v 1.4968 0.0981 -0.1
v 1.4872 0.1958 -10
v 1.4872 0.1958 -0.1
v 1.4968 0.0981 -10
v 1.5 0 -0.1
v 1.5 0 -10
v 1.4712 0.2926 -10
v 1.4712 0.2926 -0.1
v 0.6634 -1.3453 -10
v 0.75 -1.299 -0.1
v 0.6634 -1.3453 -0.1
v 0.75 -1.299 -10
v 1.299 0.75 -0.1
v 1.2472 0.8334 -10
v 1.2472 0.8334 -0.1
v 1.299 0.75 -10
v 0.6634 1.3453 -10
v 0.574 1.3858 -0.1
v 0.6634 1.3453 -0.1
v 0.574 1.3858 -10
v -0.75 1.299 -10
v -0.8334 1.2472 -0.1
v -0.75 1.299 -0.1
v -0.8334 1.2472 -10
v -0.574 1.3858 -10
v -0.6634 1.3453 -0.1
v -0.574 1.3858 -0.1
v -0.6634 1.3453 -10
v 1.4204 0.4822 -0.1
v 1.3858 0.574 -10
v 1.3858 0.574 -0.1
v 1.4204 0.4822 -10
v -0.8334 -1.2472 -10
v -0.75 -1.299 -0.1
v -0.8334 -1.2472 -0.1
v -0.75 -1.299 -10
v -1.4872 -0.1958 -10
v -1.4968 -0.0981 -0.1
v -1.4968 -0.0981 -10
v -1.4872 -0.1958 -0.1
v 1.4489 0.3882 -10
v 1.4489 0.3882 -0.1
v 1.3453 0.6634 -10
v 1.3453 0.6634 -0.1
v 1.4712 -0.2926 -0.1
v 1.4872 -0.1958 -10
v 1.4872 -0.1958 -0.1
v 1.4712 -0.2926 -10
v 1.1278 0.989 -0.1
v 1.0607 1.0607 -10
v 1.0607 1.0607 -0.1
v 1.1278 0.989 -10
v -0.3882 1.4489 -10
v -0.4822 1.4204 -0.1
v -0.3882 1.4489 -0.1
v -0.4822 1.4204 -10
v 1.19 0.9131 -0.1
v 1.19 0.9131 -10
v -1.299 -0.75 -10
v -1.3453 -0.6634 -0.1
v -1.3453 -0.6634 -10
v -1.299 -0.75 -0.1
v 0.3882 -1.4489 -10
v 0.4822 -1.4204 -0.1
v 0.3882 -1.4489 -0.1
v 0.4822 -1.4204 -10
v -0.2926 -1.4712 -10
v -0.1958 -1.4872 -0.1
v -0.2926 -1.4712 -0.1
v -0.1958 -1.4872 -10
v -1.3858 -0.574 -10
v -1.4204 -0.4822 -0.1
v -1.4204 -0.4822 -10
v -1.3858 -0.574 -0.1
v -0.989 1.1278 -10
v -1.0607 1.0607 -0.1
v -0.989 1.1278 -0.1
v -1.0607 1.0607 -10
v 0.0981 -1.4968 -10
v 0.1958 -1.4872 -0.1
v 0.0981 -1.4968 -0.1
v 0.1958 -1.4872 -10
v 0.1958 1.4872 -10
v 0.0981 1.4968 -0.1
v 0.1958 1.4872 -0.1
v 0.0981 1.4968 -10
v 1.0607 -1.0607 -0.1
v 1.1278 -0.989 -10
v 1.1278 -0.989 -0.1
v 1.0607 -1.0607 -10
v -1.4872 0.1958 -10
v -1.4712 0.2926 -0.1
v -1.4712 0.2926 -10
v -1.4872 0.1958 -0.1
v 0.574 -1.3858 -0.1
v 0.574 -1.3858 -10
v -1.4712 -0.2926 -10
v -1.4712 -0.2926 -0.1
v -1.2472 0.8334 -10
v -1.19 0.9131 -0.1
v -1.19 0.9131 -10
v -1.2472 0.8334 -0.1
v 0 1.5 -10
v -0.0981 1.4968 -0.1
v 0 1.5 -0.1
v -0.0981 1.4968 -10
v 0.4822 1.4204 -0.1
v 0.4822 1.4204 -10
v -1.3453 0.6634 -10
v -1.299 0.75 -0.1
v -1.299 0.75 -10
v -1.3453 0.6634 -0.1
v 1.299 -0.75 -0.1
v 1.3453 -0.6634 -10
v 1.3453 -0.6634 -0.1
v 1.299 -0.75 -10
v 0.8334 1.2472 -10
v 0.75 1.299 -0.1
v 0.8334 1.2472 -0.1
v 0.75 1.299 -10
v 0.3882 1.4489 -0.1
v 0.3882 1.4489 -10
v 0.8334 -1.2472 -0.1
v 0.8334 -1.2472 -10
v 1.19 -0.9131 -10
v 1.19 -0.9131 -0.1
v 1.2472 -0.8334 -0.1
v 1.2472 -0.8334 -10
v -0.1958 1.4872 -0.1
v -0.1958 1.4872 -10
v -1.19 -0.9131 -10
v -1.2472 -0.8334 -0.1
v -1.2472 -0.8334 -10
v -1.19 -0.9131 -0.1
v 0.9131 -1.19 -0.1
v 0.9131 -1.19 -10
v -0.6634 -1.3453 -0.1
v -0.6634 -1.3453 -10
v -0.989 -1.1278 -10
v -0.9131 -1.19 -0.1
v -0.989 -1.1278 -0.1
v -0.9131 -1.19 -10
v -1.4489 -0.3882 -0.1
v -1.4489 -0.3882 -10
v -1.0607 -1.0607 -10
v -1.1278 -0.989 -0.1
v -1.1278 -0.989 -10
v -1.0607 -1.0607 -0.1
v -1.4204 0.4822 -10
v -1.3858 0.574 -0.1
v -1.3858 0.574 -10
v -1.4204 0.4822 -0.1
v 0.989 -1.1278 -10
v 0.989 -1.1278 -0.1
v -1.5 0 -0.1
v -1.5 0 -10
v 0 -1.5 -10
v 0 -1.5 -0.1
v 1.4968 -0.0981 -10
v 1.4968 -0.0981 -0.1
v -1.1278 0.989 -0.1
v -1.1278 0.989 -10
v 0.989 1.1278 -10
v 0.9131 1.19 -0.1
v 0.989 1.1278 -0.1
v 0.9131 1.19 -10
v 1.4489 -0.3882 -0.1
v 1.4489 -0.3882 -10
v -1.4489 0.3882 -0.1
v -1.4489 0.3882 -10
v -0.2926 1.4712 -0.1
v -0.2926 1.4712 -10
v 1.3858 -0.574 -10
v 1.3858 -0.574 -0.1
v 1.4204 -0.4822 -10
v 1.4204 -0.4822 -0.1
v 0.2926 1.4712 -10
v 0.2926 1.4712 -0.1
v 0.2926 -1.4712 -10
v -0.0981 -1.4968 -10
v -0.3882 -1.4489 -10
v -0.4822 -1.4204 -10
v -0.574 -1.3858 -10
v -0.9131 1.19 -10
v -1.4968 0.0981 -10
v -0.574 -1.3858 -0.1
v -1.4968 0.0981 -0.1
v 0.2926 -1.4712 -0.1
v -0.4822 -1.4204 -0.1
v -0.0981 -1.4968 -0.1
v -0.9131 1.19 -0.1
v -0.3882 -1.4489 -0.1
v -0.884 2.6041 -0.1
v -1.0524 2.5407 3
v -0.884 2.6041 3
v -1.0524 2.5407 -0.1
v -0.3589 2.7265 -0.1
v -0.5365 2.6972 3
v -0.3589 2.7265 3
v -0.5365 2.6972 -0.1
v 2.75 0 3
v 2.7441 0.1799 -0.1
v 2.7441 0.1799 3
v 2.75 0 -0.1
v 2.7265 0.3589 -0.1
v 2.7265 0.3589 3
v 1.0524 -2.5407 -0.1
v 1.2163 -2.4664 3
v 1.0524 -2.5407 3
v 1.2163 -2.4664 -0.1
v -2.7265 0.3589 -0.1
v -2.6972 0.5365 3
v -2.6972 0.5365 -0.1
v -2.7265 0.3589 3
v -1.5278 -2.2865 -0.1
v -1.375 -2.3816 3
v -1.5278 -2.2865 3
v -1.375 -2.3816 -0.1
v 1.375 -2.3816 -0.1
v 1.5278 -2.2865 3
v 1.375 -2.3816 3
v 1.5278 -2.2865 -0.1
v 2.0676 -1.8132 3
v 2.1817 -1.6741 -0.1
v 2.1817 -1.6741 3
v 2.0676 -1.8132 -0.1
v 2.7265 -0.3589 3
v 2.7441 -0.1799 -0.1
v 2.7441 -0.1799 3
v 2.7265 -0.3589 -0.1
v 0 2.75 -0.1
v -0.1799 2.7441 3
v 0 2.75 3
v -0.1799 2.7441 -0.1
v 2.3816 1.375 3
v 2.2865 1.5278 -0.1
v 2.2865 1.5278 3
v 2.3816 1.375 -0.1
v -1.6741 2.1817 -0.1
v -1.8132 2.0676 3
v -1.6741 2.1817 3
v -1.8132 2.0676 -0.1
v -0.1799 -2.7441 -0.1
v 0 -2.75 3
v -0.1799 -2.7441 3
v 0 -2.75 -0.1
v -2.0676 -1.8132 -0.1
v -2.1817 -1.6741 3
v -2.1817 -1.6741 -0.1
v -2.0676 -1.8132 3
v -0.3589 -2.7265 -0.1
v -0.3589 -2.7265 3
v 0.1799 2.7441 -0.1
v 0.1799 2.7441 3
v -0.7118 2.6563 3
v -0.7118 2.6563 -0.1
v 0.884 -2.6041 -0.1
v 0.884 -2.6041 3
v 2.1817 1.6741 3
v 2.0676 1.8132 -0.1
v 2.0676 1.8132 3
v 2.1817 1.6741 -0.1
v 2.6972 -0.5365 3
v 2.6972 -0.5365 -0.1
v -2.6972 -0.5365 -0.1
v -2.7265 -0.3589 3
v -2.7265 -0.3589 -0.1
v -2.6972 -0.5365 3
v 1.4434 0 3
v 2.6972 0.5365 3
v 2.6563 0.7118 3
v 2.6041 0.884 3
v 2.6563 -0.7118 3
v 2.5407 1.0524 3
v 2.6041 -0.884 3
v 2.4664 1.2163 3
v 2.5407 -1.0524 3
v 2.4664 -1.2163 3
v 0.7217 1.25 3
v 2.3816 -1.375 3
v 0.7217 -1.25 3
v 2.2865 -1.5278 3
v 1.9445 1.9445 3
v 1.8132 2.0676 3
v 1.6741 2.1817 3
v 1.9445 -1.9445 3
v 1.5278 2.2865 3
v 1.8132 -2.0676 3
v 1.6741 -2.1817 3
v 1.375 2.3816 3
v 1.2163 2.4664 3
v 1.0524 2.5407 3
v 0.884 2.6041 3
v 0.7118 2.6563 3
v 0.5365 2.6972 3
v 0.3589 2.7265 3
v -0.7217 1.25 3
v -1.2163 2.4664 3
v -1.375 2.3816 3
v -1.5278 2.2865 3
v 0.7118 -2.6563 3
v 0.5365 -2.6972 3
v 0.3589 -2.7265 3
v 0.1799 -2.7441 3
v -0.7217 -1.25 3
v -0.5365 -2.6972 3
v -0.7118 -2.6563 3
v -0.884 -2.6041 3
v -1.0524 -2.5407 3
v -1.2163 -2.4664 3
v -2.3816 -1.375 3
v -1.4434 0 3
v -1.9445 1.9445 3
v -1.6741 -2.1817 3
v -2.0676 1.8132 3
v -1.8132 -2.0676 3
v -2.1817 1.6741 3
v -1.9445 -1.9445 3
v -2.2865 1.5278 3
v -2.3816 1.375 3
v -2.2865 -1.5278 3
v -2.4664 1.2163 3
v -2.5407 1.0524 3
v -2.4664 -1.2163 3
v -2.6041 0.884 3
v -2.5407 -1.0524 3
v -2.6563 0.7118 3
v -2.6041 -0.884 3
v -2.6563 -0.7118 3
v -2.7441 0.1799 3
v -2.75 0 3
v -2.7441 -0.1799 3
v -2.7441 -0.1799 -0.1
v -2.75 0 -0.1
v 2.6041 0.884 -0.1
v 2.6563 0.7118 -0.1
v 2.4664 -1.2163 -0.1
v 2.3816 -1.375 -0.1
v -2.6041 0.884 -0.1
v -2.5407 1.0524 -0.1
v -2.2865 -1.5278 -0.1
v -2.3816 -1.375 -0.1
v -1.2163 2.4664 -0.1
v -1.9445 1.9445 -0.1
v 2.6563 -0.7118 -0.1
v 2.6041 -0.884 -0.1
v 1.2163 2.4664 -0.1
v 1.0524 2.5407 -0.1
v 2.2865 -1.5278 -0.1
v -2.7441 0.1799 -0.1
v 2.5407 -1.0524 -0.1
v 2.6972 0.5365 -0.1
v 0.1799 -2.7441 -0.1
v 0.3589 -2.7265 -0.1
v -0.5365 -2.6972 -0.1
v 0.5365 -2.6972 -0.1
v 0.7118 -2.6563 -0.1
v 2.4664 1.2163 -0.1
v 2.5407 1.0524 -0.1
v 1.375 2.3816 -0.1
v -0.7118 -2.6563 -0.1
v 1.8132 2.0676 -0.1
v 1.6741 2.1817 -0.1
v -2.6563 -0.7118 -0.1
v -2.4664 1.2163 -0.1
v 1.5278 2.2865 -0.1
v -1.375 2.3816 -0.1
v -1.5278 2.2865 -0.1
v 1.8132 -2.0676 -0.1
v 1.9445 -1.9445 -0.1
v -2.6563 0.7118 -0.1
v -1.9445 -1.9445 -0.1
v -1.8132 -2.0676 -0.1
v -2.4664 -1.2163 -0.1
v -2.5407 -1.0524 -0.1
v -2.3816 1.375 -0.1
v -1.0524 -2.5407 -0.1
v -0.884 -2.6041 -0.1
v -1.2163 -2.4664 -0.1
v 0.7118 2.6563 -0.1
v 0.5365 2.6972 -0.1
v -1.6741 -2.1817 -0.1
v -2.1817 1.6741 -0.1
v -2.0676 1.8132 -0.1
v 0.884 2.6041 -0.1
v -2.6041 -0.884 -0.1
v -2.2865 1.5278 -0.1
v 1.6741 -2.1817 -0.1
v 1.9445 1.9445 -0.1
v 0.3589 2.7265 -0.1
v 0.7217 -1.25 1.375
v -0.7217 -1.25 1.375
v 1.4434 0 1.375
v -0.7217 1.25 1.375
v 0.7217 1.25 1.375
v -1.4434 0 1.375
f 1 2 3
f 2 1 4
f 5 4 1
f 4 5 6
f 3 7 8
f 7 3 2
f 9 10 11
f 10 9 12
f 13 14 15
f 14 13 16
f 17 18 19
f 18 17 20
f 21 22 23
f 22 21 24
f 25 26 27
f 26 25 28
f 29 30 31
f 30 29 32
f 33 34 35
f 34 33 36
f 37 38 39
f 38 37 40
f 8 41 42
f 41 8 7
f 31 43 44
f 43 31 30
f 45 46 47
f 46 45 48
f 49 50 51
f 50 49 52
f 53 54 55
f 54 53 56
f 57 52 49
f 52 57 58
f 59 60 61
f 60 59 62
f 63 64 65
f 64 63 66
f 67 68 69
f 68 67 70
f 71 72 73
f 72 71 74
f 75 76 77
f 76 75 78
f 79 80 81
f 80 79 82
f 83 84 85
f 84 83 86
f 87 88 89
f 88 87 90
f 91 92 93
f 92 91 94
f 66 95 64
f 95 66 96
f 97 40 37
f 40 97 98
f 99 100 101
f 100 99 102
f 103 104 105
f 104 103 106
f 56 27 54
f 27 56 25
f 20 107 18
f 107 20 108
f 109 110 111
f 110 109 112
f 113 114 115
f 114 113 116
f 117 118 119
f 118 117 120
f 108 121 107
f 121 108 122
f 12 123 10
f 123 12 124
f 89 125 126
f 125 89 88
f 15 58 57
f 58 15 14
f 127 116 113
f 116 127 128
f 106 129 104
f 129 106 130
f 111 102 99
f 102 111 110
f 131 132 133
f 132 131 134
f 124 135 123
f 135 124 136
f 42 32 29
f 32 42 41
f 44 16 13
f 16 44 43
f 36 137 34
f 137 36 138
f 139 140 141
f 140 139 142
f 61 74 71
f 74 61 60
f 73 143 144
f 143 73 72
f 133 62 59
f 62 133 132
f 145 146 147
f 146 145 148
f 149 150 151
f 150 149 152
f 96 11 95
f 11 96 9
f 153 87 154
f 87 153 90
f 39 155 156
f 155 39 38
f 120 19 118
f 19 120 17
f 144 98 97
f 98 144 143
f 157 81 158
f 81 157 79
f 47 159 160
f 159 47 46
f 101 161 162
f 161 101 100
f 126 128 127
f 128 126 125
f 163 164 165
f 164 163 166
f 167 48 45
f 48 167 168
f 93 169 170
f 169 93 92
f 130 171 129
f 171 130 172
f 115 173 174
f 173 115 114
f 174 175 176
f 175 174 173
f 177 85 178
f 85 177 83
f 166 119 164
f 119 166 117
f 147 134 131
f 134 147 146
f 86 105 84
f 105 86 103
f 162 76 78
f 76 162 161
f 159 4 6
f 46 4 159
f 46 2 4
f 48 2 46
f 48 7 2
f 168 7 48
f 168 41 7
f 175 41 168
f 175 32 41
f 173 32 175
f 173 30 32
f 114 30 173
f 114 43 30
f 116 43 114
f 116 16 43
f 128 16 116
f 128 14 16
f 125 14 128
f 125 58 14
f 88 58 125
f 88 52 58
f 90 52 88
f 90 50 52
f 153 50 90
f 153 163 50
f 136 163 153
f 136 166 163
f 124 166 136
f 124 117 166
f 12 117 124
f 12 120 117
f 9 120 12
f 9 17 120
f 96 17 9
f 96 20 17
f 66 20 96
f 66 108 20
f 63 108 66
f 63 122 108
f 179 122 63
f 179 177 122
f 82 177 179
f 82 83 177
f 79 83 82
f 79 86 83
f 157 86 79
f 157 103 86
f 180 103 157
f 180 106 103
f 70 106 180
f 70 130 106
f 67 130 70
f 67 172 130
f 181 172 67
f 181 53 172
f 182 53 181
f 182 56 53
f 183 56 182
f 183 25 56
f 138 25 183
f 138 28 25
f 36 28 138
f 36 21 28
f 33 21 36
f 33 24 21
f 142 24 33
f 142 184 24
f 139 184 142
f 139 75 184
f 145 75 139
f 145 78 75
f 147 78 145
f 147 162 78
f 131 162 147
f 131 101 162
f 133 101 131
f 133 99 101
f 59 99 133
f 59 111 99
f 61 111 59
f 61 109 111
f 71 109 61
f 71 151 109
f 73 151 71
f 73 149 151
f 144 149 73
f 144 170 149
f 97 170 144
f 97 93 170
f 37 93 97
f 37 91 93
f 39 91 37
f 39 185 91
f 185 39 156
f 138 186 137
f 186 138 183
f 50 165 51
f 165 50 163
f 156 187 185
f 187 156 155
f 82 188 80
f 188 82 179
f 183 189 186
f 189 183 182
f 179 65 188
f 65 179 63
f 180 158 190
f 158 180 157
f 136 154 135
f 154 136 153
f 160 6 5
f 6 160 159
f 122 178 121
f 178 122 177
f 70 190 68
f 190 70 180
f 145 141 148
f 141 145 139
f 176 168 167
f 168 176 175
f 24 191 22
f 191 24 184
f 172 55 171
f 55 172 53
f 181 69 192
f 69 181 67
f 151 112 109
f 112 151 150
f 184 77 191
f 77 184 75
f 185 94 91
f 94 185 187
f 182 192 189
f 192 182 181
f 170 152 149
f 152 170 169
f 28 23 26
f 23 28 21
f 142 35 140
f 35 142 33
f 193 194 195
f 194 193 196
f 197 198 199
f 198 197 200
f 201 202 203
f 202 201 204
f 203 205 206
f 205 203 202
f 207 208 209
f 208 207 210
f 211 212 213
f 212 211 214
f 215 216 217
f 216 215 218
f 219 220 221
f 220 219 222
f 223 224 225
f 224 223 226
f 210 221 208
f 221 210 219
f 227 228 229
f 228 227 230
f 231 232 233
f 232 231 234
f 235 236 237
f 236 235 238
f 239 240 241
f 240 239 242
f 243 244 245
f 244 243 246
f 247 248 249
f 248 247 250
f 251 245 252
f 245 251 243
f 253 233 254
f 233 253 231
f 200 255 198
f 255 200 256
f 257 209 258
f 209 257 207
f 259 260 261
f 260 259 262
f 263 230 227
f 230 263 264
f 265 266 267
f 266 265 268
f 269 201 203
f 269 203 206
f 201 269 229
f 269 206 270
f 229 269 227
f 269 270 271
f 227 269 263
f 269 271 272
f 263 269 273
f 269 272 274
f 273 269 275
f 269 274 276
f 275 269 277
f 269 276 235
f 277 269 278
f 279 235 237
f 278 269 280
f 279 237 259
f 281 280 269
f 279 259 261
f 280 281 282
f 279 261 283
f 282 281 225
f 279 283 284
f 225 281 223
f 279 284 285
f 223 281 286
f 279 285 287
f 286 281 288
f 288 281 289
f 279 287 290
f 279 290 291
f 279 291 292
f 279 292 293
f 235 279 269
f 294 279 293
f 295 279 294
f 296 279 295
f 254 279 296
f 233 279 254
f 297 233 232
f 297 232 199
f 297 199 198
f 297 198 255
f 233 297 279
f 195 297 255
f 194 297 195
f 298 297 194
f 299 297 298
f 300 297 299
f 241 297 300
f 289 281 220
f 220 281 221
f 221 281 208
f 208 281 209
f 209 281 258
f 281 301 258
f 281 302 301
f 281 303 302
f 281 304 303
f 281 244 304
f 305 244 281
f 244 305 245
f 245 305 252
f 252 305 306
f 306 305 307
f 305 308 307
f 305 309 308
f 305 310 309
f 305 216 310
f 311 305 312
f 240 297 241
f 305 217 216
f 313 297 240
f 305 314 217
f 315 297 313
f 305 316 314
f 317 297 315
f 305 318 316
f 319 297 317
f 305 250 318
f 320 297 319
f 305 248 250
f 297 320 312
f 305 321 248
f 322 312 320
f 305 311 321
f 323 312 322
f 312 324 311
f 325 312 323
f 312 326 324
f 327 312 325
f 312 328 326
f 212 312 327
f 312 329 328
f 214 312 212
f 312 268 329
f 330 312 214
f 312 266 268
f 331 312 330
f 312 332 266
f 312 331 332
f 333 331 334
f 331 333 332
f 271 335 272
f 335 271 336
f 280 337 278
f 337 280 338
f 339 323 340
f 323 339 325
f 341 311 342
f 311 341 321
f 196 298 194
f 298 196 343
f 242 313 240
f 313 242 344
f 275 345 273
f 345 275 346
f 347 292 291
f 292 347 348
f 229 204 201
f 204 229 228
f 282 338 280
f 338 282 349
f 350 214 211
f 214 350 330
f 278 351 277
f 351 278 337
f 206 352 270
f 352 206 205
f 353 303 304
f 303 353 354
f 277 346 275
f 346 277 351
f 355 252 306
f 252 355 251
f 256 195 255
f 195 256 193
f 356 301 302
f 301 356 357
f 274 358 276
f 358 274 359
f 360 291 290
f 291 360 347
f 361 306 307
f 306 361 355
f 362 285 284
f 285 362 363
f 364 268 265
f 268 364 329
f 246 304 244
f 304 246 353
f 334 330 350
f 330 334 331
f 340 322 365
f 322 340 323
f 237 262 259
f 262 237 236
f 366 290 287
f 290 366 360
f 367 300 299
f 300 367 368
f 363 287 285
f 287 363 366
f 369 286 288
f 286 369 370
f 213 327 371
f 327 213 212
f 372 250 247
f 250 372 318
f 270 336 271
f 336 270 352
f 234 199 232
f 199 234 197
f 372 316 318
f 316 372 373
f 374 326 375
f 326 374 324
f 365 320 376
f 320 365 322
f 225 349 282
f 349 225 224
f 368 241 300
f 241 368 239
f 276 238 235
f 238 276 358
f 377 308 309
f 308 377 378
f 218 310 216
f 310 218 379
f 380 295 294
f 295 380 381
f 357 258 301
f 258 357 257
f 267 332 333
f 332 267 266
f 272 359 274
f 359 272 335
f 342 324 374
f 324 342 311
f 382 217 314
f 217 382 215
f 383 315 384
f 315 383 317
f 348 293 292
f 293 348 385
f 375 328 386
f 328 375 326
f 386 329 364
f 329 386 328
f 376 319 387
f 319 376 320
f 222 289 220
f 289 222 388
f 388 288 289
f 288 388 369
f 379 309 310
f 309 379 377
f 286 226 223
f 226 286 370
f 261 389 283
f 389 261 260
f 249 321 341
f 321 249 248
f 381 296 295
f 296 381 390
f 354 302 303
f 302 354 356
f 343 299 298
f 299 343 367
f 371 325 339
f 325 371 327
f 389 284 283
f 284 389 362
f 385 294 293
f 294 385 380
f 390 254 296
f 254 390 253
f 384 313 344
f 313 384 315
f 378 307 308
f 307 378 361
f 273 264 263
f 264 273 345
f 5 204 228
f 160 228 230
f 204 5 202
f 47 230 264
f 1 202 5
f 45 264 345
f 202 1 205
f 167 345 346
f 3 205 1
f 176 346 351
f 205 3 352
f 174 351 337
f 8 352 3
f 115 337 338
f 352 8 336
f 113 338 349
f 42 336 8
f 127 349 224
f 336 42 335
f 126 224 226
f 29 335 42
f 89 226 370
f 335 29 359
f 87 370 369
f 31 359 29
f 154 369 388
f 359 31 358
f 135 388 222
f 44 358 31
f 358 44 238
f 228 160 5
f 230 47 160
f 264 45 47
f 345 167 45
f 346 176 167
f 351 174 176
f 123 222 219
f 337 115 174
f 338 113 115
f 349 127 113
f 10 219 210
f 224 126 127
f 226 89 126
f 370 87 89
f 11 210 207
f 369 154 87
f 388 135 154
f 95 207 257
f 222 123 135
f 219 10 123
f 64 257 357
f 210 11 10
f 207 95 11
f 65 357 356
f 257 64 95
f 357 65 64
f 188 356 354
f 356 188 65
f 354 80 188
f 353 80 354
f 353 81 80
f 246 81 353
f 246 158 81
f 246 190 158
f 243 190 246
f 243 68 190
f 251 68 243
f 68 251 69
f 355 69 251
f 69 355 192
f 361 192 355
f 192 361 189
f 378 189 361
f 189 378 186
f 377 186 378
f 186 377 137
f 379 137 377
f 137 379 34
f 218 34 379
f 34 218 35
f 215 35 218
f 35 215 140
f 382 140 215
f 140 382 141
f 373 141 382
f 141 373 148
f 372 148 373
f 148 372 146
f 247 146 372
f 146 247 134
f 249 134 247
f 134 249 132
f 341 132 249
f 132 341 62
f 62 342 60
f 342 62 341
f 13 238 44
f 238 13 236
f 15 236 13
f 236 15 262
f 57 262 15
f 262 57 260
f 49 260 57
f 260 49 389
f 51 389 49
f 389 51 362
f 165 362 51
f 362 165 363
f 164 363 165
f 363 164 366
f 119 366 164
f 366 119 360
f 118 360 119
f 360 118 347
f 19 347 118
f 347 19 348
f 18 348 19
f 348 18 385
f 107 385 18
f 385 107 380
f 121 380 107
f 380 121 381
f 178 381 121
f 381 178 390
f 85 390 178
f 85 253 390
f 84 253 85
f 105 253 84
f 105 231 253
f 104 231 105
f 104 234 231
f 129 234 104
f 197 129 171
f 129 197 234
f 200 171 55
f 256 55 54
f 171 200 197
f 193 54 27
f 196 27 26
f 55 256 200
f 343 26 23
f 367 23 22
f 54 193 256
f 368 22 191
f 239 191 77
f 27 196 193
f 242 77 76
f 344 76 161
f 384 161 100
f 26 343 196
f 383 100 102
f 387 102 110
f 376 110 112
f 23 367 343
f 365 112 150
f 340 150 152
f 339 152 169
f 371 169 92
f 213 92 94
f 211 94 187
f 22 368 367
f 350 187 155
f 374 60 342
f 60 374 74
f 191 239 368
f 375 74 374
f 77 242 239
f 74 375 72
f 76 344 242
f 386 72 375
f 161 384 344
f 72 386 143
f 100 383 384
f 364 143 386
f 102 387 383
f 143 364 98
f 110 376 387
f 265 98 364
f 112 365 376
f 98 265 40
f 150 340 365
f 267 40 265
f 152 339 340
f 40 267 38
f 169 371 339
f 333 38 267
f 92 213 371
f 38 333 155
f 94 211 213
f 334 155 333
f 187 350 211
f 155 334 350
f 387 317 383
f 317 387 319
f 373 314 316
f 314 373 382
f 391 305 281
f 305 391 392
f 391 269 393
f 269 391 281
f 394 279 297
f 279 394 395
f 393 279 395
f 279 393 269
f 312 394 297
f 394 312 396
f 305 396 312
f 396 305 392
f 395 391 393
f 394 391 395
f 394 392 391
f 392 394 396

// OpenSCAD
// Socket head cap screw (single connected solid)
// Requested: 3.0mm diameter shank, 5.5mm head diameter, 3.0mm head height, 10mm long

$fn = 96;

// Parameters
shaft_diameter_mm = 3.0;
length_mm         = 10.0;   // under-head length
head_diameter_mm  = 5.5;
head_height_mm    = 3.0;

// Socket (hex recess) parameters (typical for M3 SHCS)
socket_af_mm      = 2.5;    // across flats
socket_depth_mm   = 1.6;

// Small overlap to ensure watertight unions/differences
overlap_mm = 0.05;

module socket_head_cap_screw(
    d_shaft=3.0,
    L=10.0,
    d_head=5.5,
    h_head=3.0,
    af=2.5,
    socket_depth=1.6
){
    r_shaft = d_shaft/2;
    r_head  = d_head/2;

    // Hex radius for cylinder($fn=6) such that across-flats = af
    // For a regular hex: across_flats = 2 * r * cos(30)
    r_hex = af / (2*cos(30));

    // Clamp socket depth so it doesn't exceed head height
    sd = min(socket_depth, h_head - 0.2);

    difference() {
        union() {
            // Shank: from z=0 (under head) down to z=-L
            translate([0,0,-L/2])
                cylinder(h=L, r=r_shaft, center=true);

            // Head: from z=0 up to z=+h_head
            translate([0,0,h_head/2 - overlap_mm])
                cylinder(h=h_head + 2*overlap_mm, r=r_head, center=true);
        }

        // Hex socket recess: cut from top face downward
        translate([0,0,h_head - sd/2])
            cylinder(h=sd + overlap_mm, r=r_hex, center=true, $fn=6);
    }
}

socket_head_cap_screw(
    d_shaft=shaft_diameter_mm,
    L=length_mm,
    d_head=head_diameter_mm,
    h_head=head_height_mm,
    af=socket_af_mm,
    socket_depth=socket_depth_mm
);
